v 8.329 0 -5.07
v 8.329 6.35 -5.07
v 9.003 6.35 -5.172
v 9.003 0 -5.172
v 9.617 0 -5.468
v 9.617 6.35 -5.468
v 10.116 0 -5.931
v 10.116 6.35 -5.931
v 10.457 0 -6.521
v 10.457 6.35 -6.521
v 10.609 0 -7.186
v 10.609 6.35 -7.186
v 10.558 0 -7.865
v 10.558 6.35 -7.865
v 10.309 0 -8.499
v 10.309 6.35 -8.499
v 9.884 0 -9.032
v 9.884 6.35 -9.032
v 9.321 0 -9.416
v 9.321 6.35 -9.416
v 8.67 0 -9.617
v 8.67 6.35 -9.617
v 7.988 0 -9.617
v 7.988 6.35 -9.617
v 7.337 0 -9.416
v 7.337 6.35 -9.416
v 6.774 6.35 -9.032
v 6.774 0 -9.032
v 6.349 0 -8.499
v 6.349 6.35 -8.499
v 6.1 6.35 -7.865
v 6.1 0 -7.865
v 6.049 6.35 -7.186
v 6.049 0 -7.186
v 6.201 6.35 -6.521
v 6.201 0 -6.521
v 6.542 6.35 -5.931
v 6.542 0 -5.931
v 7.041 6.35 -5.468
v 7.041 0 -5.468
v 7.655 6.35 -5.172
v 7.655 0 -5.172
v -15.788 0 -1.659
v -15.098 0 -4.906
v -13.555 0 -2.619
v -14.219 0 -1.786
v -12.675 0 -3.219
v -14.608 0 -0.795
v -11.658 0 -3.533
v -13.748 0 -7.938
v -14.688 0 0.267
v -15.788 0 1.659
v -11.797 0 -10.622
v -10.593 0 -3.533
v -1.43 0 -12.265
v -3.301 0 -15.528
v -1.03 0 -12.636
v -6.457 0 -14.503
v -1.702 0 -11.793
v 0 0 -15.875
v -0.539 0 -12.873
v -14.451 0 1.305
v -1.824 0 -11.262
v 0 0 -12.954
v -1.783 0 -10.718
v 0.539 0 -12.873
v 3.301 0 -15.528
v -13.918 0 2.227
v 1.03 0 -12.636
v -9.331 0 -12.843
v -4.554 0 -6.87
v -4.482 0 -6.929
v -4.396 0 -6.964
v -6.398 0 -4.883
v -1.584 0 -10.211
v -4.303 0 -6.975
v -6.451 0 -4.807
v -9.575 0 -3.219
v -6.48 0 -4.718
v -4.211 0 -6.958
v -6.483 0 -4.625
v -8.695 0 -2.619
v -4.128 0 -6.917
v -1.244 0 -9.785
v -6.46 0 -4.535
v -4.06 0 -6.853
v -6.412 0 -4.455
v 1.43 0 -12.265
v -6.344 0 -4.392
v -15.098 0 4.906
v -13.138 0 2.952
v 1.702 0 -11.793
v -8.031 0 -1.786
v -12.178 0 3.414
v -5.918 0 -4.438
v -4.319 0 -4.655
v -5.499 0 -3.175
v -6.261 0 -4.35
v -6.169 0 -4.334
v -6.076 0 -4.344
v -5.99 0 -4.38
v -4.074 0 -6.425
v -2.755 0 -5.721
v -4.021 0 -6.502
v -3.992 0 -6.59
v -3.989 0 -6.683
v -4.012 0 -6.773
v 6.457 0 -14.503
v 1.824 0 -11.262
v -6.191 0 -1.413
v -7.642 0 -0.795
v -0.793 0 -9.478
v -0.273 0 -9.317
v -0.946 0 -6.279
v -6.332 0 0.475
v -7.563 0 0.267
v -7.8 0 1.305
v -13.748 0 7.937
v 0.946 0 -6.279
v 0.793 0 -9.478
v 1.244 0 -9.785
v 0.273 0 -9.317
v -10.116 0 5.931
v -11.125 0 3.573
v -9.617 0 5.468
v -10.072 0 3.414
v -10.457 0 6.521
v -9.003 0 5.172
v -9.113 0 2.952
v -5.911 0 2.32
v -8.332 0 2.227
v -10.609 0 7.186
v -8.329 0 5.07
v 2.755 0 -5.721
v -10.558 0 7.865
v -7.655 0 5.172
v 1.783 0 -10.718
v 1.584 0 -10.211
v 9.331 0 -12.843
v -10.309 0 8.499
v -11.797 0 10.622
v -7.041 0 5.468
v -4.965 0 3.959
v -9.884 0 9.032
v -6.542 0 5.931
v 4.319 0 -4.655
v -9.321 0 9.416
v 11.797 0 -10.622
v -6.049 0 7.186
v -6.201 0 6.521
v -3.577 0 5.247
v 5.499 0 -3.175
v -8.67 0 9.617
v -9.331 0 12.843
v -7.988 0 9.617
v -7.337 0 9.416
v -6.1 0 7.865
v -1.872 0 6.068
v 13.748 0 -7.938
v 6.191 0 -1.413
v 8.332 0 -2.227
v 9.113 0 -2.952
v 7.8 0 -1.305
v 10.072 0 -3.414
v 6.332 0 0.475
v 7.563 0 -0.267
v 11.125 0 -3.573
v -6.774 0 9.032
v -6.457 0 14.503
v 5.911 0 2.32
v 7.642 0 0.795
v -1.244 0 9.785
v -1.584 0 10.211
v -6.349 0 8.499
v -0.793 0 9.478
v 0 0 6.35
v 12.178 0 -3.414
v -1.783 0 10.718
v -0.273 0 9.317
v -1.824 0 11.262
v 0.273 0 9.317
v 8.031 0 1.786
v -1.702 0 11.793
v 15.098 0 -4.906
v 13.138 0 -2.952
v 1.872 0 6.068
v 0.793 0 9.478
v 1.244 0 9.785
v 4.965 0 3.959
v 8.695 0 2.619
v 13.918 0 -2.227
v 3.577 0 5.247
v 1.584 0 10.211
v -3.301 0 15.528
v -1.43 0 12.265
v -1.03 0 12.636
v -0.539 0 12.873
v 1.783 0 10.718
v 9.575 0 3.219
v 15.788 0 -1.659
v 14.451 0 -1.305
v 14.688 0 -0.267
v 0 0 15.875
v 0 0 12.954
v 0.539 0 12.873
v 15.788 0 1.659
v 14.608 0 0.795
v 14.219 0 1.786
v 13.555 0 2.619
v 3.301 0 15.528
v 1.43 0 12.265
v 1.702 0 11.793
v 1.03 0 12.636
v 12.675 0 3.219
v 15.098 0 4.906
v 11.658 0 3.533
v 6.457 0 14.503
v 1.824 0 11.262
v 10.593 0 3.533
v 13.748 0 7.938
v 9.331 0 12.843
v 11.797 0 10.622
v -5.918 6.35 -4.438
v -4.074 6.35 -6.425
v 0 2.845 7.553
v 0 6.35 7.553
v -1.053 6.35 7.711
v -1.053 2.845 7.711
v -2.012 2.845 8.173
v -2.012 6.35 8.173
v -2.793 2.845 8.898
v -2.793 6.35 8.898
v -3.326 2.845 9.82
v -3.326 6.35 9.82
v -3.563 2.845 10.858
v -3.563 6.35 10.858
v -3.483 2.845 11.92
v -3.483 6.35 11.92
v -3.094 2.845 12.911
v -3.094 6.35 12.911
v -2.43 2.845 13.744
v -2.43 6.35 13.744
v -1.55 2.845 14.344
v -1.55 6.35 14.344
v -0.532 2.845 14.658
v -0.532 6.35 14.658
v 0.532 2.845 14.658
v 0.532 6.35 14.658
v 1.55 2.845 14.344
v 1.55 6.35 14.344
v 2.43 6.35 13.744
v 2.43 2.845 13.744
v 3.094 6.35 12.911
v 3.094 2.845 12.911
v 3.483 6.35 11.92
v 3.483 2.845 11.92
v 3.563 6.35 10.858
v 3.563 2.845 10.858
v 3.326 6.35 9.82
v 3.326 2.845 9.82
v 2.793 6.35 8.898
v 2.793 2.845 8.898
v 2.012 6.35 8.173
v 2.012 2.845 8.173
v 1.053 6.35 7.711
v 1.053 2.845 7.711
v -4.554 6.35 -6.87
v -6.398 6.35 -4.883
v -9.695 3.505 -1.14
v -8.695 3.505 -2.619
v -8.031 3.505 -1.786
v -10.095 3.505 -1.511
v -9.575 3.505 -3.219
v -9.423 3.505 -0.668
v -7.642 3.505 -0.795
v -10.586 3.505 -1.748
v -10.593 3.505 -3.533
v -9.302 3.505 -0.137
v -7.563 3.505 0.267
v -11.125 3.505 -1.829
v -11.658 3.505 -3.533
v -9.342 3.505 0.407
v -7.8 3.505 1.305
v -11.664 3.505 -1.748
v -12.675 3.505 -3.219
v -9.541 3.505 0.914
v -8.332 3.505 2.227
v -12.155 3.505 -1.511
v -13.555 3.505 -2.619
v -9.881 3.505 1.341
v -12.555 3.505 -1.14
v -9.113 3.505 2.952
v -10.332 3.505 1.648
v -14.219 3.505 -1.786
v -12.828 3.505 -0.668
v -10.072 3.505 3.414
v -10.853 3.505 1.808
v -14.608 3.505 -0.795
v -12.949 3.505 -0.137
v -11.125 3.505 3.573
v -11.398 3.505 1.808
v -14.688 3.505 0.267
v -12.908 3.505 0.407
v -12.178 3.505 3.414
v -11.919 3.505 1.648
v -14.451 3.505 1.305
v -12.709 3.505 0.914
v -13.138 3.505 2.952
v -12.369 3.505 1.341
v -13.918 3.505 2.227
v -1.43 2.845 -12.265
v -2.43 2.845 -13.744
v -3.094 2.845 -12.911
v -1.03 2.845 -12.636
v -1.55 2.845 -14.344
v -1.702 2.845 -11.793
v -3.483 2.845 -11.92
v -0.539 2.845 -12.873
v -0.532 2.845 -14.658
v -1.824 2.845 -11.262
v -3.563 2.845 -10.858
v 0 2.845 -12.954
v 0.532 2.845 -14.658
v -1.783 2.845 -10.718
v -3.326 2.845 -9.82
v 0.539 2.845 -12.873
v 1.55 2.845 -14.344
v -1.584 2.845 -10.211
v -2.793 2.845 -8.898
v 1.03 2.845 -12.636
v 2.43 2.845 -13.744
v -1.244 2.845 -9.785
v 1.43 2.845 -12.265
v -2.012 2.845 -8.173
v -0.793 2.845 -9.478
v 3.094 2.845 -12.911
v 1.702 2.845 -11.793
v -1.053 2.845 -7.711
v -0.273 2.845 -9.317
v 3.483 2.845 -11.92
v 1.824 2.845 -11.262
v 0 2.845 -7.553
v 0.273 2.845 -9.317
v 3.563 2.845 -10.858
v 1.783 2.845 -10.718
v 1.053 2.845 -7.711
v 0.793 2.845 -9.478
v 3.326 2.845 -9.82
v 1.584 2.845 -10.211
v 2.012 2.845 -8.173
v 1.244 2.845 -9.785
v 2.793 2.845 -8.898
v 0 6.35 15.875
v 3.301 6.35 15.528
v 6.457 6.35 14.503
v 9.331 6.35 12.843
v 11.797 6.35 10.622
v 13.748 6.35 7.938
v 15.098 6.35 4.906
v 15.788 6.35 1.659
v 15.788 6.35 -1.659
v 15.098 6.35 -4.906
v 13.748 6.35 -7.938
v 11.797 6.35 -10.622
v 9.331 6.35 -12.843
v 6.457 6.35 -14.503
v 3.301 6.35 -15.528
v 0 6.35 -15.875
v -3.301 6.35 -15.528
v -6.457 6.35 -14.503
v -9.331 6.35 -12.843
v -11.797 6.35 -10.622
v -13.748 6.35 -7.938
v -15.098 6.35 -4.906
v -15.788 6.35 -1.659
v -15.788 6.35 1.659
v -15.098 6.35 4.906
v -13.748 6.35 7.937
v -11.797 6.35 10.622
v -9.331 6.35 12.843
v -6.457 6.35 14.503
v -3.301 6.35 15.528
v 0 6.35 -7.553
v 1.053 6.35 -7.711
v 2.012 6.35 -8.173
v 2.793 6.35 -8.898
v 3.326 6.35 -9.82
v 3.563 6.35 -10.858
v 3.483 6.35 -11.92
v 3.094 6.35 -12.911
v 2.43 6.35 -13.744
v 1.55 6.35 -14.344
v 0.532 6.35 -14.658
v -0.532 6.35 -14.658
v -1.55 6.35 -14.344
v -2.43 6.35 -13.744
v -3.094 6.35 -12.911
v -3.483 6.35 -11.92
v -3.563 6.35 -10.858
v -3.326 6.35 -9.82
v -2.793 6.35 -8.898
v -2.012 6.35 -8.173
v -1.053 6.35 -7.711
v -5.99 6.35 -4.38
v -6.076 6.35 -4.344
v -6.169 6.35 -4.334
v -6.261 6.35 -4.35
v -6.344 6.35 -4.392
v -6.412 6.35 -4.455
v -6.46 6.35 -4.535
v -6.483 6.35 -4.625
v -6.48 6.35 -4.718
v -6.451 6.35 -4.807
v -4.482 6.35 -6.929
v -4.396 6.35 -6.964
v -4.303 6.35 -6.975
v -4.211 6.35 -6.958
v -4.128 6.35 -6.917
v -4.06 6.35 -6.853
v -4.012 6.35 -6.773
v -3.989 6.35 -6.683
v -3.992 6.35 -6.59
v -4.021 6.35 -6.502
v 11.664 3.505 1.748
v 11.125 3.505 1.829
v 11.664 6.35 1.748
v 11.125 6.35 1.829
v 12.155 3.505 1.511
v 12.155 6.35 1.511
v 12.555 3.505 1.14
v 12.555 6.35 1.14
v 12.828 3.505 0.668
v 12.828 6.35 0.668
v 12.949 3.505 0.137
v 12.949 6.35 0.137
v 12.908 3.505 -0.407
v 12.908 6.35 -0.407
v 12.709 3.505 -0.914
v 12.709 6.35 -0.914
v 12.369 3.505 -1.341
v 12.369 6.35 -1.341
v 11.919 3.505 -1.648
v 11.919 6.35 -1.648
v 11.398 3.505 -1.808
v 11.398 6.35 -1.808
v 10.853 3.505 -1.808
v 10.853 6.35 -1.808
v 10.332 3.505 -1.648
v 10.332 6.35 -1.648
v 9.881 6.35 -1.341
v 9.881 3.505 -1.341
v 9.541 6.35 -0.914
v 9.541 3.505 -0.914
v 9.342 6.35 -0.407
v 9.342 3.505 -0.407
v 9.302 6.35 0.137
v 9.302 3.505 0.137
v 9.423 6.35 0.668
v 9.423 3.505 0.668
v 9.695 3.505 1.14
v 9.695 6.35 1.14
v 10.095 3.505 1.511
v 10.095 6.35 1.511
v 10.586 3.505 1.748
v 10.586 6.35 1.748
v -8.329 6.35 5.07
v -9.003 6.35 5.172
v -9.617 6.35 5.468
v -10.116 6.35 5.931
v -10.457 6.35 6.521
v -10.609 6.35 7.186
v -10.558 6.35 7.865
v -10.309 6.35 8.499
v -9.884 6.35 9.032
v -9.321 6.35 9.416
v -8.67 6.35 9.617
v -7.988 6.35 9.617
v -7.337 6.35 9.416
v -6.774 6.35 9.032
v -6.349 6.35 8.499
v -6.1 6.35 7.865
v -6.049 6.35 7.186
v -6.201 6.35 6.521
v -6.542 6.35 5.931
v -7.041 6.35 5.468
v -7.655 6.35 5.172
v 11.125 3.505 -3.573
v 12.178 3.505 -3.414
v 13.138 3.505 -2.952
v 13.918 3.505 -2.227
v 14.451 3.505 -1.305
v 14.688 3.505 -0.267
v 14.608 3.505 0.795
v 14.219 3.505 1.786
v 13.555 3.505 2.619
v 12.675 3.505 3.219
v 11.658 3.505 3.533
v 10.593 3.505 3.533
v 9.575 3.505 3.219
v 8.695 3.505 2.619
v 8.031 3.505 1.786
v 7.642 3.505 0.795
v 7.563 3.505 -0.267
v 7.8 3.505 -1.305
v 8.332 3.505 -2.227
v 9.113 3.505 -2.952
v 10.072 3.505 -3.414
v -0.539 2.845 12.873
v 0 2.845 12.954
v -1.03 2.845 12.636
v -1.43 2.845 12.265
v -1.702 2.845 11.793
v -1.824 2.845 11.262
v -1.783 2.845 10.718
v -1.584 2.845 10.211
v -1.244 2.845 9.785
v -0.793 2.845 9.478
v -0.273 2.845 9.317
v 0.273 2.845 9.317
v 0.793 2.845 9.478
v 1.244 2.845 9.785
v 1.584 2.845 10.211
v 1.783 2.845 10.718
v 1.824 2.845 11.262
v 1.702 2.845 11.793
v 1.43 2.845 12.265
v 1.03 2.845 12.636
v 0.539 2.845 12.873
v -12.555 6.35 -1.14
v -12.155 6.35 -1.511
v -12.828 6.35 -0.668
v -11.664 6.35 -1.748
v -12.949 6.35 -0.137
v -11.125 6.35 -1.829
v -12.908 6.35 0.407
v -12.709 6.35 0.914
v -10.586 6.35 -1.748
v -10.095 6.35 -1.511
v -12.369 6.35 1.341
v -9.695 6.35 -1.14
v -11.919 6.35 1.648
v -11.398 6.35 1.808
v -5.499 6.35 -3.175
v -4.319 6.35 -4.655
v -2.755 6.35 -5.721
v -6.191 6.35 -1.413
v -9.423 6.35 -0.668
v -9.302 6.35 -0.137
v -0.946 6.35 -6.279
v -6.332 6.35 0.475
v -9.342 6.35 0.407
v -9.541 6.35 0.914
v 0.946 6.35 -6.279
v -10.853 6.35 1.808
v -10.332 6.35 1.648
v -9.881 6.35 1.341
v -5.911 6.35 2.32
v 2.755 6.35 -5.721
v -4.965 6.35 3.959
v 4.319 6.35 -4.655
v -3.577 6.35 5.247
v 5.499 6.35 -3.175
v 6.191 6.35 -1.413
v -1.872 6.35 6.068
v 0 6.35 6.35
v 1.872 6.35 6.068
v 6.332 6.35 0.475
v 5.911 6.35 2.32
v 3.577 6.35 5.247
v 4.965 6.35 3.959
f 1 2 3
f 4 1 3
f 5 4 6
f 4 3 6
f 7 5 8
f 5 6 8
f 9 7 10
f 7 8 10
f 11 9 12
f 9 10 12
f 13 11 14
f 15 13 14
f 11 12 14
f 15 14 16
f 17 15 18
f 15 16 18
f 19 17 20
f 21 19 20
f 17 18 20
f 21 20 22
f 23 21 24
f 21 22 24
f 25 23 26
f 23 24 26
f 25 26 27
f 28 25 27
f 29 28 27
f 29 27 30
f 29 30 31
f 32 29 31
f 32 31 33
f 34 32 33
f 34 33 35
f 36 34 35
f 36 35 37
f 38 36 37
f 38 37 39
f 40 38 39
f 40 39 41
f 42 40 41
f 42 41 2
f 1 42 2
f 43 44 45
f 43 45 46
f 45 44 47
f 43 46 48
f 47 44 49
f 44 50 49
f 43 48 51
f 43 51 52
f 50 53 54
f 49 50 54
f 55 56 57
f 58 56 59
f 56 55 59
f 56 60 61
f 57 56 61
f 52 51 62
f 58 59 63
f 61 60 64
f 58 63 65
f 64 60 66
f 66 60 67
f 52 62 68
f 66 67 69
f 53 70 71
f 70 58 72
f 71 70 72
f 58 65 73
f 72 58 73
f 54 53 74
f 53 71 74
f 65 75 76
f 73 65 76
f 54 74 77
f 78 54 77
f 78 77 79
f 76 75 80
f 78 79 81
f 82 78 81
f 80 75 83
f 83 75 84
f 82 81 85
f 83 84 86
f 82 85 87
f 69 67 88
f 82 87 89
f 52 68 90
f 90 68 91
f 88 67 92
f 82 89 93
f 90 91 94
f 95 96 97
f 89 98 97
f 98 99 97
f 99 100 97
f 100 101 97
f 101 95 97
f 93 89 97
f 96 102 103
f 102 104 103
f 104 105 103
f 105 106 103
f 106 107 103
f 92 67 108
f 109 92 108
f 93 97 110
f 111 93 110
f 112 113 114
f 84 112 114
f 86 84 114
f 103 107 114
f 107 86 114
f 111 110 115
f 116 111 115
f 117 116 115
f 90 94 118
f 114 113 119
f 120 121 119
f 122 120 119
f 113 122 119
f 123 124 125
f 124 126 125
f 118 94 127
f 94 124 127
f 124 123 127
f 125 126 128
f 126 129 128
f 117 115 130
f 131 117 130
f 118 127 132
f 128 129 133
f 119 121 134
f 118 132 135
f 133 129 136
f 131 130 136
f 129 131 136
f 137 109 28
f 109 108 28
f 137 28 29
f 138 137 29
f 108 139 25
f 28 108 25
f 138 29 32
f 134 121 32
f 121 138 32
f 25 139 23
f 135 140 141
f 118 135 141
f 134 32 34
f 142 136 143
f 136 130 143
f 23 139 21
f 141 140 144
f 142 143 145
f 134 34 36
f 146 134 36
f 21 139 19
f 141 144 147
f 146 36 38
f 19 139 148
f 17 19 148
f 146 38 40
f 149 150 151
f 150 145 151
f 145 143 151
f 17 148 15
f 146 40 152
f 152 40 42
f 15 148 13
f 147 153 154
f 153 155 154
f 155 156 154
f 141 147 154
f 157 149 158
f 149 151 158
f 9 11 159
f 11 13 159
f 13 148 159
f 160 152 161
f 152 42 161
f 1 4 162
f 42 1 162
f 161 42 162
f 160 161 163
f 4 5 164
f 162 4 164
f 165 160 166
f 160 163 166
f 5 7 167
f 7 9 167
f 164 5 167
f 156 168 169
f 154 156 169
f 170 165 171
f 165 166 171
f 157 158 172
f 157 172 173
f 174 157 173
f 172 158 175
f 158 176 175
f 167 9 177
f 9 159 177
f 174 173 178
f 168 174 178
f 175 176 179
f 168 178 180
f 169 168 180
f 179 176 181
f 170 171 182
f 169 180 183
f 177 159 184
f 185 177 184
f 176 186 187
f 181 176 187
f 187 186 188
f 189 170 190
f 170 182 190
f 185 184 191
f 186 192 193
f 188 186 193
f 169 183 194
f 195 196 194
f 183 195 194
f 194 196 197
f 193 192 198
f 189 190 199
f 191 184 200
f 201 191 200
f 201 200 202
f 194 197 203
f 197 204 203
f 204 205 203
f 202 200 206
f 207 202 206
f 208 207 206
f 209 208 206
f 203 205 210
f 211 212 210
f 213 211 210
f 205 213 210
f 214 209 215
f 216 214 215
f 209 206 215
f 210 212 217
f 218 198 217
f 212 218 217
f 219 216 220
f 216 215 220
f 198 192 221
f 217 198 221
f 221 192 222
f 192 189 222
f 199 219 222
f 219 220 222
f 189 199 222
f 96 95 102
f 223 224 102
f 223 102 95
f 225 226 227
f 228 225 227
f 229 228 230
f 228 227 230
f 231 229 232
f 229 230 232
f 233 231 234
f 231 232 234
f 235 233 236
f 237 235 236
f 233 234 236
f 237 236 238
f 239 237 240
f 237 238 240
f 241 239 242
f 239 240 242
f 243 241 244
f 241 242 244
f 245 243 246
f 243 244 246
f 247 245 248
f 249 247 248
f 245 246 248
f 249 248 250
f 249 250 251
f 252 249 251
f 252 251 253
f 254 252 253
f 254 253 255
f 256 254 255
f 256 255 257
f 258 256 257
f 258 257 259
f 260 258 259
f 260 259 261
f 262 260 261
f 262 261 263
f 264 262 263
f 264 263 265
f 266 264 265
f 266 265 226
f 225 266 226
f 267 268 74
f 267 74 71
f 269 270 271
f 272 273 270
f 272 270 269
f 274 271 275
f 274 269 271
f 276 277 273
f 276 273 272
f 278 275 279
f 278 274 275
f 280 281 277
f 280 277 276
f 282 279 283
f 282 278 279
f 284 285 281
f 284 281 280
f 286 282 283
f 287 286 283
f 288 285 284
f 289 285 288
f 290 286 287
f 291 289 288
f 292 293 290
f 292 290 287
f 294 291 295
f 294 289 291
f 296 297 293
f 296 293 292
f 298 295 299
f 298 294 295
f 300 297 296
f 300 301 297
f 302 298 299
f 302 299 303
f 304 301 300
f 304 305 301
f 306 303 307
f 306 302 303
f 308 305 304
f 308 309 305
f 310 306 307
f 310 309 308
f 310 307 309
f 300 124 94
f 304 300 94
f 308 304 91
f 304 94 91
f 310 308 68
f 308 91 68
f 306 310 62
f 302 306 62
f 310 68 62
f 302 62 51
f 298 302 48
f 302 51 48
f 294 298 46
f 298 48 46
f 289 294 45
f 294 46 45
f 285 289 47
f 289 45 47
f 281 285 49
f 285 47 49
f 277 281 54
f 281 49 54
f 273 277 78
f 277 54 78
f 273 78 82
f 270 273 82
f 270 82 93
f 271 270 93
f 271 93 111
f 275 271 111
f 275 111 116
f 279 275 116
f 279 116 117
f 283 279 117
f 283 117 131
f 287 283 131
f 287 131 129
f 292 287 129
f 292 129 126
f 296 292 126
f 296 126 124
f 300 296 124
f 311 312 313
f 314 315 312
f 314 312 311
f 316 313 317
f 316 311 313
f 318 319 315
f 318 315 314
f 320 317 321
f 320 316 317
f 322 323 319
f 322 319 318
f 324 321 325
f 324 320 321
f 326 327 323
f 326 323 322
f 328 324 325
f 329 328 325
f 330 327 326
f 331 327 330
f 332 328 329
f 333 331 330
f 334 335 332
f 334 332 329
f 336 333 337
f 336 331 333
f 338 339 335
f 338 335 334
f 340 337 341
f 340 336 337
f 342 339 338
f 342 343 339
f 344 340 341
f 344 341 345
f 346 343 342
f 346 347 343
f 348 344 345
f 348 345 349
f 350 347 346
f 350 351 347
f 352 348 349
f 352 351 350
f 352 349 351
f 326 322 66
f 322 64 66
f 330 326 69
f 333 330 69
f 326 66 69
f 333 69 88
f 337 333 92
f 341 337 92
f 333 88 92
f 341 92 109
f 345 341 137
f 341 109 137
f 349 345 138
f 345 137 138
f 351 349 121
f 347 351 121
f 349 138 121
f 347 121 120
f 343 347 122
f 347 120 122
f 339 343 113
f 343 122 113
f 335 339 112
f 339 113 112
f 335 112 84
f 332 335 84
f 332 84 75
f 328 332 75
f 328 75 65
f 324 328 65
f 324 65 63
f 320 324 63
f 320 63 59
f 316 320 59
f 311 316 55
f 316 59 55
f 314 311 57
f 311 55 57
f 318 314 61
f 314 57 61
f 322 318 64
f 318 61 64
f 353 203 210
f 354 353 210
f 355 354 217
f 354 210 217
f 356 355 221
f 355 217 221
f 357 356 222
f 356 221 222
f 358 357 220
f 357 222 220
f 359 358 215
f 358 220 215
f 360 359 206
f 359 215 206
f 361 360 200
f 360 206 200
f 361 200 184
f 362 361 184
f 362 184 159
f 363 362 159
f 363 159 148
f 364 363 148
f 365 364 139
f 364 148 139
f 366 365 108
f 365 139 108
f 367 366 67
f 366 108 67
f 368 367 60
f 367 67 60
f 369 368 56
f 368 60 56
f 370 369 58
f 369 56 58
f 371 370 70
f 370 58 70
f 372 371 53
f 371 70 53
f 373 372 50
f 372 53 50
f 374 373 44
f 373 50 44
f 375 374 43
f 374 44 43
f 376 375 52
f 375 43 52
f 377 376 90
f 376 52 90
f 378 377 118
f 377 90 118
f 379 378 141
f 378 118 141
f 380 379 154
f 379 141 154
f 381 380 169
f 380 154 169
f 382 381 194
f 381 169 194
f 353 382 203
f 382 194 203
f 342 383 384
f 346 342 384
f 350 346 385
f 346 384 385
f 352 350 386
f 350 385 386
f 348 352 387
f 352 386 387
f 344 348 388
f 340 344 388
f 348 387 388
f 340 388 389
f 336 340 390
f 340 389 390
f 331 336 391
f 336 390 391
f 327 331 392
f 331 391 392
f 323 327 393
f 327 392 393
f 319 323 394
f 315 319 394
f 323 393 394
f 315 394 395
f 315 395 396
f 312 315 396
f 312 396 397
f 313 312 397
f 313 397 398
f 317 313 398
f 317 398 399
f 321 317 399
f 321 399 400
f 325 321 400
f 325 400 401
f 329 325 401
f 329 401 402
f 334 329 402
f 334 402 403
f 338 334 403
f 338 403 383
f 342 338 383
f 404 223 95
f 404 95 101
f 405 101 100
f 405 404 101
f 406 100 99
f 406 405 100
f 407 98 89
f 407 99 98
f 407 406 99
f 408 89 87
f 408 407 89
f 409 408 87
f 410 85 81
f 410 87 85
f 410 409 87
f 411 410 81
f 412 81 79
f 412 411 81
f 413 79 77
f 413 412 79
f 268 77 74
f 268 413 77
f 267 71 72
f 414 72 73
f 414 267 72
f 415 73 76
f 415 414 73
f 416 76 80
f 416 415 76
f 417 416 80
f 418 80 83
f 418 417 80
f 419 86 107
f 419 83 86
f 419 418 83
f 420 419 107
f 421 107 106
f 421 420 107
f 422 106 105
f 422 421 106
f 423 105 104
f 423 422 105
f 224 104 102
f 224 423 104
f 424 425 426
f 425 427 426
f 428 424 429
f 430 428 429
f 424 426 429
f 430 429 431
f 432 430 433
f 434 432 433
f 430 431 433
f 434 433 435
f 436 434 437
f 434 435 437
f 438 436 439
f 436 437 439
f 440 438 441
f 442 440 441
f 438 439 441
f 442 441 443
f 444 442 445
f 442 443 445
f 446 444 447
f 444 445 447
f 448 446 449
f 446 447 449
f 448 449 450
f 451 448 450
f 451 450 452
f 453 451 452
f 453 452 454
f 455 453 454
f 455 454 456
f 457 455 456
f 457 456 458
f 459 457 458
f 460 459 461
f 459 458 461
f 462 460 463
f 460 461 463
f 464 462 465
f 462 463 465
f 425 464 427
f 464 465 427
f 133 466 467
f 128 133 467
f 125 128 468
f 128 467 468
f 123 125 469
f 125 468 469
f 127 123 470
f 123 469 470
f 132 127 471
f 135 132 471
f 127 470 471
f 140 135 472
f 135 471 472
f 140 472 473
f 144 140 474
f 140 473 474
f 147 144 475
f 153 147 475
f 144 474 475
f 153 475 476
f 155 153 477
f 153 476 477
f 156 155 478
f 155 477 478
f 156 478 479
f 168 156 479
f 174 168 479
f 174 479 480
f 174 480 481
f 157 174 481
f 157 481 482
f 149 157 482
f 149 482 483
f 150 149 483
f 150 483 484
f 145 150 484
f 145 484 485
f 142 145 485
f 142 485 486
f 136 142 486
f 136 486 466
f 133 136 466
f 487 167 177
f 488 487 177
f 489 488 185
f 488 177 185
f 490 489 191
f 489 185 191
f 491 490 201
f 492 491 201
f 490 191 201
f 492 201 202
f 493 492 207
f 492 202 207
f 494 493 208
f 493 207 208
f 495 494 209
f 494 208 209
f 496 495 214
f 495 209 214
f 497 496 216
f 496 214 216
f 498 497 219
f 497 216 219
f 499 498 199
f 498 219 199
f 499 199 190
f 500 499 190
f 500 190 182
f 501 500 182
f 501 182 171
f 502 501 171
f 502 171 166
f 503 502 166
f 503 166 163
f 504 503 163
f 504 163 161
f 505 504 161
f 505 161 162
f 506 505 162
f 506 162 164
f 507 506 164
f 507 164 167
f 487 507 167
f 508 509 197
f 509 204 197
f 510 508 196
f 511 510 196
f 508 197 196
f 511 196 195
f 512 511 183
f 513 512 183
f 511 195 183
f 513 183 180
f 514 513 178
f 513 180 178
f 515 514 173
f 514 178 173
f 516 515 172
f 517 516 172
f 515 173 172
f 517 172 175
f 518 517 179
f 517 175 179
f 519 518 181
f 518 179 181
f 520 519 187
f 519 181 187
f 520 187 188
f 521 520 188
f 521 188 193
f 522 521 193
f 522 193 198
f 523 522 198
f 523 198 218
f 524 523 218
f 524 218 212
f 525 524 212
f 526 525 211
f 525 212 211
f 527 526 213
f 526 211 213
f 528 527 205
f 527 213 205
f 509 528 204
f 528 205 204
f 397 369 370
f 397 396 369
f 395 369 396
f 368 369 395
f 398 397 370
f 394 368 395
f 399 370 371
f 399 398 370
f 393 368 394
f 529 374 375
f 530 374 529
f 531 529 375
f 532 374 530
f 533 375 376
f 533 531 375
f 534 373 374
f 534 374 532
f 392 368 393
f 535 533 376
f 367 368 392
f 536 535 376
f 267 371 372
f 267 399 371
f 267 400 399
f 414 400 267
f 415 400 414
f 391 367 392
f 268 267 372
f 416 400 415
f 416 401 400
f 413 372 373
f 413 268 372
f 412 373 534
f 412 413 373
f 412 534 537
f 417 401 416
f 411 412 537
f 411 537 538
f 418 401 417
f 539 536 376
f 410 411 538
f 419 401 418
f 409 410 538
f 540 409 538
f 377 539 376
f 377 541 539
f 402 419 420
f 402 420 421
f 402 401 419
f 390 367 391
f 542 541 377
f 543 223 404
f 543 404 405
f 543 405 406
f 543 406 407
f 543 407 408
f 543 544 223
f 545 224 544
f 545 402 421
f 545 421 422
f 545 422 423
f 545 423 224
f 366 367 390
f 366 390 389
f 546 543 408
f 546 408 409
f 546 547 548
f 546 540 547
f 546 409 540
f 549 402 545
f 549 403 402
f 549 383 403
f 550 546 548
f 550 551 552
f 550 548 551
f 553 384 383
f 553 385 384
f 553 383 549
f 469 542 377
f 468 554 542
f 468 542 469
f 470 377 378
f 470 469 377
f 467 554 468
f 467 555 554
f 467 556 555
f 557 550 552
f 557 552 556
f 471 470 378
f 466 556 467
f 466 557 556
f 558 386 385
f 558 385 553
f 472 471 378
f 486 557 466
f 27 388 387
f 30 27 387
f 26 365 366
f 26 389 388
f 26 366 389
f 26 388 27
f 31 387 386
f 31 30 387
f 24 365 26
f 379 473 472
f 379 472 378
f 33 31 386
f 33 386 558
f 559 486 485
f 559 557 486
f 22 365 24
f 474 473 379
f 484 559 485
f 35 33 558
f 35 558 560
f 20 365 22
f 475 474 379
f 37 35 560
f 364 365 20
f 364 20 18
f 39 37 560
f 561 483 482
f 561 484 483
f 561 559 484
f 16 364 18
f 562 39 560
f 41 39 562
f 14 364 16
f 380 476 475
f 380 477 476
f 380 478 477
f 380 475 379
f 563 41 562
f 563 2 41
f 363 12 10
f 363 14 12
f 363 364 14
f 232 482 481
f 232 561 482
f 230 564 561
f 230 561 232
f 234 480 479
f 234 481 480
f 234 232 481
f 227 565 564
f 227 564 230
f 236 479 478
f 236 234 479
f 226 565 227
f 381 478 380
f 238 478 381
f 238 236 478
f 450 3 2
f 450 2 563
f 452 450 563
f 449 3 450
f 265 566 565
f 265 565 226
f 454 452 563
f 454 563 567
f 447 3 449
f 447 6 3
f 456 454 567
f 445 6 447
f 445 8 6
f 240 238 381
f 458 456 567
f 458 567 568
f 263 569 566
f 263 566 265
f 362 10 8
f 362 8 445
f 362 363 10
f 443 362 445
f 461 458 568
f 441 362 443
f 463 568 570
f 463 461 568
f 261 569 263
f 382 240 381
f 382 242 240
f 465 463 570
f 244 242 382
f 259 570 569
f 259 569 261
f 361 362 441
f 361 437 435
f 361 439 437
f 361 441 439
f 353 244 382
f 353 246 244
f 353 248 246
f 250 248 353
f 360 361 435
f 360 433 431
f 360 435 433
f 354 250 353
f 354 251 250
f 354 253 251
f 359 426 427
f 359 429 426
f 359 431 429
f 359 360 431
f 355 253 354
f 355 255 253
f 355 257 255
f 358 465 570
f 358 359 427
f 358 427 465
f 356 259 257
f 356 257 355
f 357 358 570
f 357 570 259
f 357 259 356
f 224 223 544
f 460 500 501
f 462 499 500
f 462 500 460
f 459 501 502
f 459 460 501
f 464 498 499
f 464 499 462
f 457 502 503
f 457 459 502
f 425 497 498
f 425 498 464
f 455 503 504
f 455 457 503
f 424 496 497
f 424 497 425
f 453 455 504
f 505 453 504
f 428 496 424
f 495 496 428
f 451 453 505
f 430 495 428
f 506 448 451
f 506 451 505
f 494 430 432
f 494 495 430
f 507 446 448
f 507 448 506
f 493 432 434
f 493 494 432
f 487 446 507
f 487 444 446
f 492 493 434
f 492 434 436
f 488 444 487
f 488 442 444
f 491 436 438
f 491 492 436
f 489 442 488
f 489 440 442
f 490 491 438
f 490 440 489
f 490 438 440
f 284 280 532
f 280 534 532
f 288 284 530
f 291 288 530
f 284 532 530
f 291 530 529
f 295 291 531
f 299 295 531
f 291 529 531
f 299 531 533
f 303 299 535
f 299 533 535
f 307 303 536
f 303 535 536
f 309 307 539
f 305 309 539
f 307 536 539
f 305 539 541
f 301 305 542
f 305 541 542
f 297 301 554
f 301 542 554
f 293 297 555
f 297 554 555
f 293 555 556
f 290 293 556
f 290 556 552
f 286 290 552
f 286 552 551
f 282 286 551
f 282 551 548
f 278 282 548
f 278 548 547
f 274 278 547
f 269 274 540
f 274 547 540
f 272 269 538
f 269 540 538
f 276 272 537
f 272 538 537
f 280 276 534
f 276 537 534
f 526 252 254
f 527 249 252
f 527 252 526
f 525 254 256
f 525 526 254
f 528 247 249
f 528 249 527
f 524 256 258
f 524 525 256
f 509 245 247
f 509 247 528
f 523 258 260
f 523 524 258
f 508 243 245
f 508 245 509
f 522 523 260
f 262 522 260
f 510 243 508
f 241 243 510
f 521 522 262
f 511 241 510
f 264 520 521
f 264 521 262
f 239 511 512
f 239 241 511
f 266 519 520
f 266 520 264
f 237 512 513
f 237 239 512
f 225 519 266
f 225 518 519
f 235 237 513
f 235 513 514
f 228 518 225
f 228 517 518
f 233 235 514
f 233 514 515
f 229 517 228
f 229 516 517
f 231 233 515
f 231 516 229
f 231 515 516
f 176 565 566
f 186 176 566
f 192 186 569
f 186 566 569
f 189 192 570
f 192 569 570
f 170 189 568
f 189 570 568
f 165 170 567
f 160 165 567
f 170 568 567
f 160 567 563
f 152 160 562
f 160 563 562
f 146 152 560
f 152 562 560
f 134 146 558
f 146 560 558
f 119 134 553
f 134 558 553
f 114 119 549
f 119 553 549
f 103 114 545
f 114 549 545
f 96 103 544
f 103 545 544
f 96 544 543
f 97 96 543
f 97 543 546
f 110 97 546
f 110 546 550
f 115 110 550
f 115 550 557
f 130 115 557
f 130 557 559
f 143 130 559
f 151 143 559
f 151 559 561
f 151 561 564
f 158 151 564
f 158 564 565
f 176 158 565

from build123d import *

# Parameters (mm, degrees)
SKETCH1_R                                      = 15.875
BOSS_EXTRUDE1_DEPTH                            = 6.35
SKETCH2_R                                      = 6.35
CUT_EXTRUDE1_DEPTH                             = 24.3313898
SKETCH11_R                                     = 2.286
CUT_EXTRUDE2_DEPTH                             = 24.3313898
CIRPATTERN3_COUNT                              = 2
CUT_EXTRUDE3_DEPTH                             = 24.3313898
CBORE_FOR_6_SOCKET_HEAD_CAP_SCREW2_D           = 3.6576
CBORE_FOR_6_SOCKET_HEAD_CAP_SCREW2_CBORE_D     = 7.14502
CBORE_FOR_6_SOCKET_HEAD_CAP_SCREW2_CBORE_DEPTH = 3.5052
CBORE_FOR_6_SOCKET_HEAD_CAP_SCREW1_D           = 3.6576
CBORE_FOR_6_SOCKET_HEAD_CAP_SCREW1_CBORE_D     = 7.14502
CBORE_FOR_6_SOCKET_HEAD_CAP_SCREW1_CBORE_DEPTH = 3.5052
CIRPATTERN5_COUNT                              = 2
CIRPATTERN6_COUNT                              = 2


with BuildPart() as part:
    # Sketch1 → Boss-Extrude1 (new body)
    with BuildSketch(Plane(origin=(0, 0, 0), x_dir=(1, 0, 0), z_dir=(0, 1, 0))):
        with Locations(Location((0, 0, 0), (0, 0, 270))):
            Circle(SKETCH1_R)
    extrude(amount=BOSS_EXTRUDE1_DEPTH)

    # Sketch2 → Cut-Extrude1 (cut, through all)
    with BuildSketch(Plane(origin=(0, 6.35, 0), x_dir=(1, 0, 0), z_dir=(0, 1, 0))):
        with Locations(Location((0, 0, 0), (0, 0, 270))):
            Circle(SKETCH2_R)
    extrude(amount=-CUT_EXTRUDE1_DEPTH, mode=Mode.SUBTRACT)

    # Sketch11 → Cut-Extrude2 (cut, through all)
    with BuildSketch(Plane(origin=(0, 6.35, 0), x_dir=(1, 0, 0), z_dir=(0, 1, 0))):
        with Locations(Location((8.328911597, 7.35641814, 0), (0, 0, 270))):
            Circle(SKETCH11_R)
    cut_extrude2 = extrude(amount=-CUT_EXTRUDE2_DEPTH, mode=Mode.SUBTRACT)

    # CirPattern3: Cut-Extrude2 ×2 about axis
    cirpattern3_axis = Axis((0, 0, 0), (0, 1, 0))
    for i in range(1, CIRPATTERN3_COUNT):
        add(cut_extrude2.rotate(cirpattern3_axis, i * 360 / CIRPATTERN3_COUNT), mode=Mode.SUBTRACT)

    # Sketch12 → Cut-Extrude3 (cut, through all)
    with BuildSketch(Plane(origin=(0, 6.35, 0), x_dir=(1, 0, 0), z_dir=(0, 1, 0))):
        with BuildLine():
            Line((-6.39758264, 4.883452605), (-4.554151289, 6.87011727))
            ThreePointArc((-4.554151289, 6.87011727), (-4.0916663, 6.887412726), (-4.074370844, 6.424927737))
            Line((-4.074370844, 6.424927737), (-5.917802195, 4.438263073))
            ThreePointArc((-5.917802195, 4.438263073), (-6.380287183, 4.420967617), (-6.39758264, 4.883452605))
        make_face()
    extrude(amount=-CUT_EXTRUDE3_DEPTH, mode=Mode.SUBTRACT)

    # CBORE for #6 Socket Head Cap Screw2 (through all)
    with Locations(Plane(origin=(11.1252, 0, 0), x_dir=(0, 0, -1), z_dir=(0, -1, 0))):
        with Locations((0, 0)):
            cbore_for_6_socket_head_cap_screw2 = CounterBoreHole(CBORE_FOR_6_SOCKET_HEAD_CAP_SCREW2_D / 2, CBORE_FOR_6_SOCKET_HEAD_CAP_SCREW2_CBORE_D / 2, CBORE_FOR_6_SOCKET_HEAD_CAP_SCREW2_CBORE_DEPTH)

    # CBORE for #6 Socket Head Cap Screw1 (through all)
    with Locations(Plane(origin=(0, 6.35, -11.1252), x_dir=(0, 0, 1), z_dir=(0, 1, 0))):
        with Locations((0, 0)):
            cbore_for_6_socket_head_cap_screw1 = CounterBoreHole(CBORE_FOR_6_SOCKET_HEAD_CAP_SCREW1_D / 2, CBORE_FOR_6_SOCKET_HEAD_CAP_SCREW1_CBORE_D / 2, CBORE_FOR_6_SOCKET_HEAD_CAP_SCREW1_CBORE_DEPTH)

    # CirPattern5: CBORE for #6 Socket Head Cap Screw1 ×2 about axis
    cirpattern5_axis = Axis((0, 0, 0), (0, 1, 0))
    for i in range(1, CIRPATTERN5_COUNT):
        add(cbore_for_6_socket_head_cap_screw1.rotate(cirpattern5_axis, i * 360 / CIRPATTERN5_COUNT), mode=Mode.SUBTRACT)

    # CirPattern6: CBORE for #6 Socket Head Cap Screw2 ×2 about axis
    cirpattern6_axis = Axis((0, 0, 0), (0, 1, 0))
    for i in range(1, CIRPATTERN6_COUNT):
        add(cbore_for_6_socket_head_cap_screw2.rotate(cirpattern6_axis, i * 360 / CIRPATTERN6_COUNT), mode=Mode.SUBTRACT)


solid = part.part
